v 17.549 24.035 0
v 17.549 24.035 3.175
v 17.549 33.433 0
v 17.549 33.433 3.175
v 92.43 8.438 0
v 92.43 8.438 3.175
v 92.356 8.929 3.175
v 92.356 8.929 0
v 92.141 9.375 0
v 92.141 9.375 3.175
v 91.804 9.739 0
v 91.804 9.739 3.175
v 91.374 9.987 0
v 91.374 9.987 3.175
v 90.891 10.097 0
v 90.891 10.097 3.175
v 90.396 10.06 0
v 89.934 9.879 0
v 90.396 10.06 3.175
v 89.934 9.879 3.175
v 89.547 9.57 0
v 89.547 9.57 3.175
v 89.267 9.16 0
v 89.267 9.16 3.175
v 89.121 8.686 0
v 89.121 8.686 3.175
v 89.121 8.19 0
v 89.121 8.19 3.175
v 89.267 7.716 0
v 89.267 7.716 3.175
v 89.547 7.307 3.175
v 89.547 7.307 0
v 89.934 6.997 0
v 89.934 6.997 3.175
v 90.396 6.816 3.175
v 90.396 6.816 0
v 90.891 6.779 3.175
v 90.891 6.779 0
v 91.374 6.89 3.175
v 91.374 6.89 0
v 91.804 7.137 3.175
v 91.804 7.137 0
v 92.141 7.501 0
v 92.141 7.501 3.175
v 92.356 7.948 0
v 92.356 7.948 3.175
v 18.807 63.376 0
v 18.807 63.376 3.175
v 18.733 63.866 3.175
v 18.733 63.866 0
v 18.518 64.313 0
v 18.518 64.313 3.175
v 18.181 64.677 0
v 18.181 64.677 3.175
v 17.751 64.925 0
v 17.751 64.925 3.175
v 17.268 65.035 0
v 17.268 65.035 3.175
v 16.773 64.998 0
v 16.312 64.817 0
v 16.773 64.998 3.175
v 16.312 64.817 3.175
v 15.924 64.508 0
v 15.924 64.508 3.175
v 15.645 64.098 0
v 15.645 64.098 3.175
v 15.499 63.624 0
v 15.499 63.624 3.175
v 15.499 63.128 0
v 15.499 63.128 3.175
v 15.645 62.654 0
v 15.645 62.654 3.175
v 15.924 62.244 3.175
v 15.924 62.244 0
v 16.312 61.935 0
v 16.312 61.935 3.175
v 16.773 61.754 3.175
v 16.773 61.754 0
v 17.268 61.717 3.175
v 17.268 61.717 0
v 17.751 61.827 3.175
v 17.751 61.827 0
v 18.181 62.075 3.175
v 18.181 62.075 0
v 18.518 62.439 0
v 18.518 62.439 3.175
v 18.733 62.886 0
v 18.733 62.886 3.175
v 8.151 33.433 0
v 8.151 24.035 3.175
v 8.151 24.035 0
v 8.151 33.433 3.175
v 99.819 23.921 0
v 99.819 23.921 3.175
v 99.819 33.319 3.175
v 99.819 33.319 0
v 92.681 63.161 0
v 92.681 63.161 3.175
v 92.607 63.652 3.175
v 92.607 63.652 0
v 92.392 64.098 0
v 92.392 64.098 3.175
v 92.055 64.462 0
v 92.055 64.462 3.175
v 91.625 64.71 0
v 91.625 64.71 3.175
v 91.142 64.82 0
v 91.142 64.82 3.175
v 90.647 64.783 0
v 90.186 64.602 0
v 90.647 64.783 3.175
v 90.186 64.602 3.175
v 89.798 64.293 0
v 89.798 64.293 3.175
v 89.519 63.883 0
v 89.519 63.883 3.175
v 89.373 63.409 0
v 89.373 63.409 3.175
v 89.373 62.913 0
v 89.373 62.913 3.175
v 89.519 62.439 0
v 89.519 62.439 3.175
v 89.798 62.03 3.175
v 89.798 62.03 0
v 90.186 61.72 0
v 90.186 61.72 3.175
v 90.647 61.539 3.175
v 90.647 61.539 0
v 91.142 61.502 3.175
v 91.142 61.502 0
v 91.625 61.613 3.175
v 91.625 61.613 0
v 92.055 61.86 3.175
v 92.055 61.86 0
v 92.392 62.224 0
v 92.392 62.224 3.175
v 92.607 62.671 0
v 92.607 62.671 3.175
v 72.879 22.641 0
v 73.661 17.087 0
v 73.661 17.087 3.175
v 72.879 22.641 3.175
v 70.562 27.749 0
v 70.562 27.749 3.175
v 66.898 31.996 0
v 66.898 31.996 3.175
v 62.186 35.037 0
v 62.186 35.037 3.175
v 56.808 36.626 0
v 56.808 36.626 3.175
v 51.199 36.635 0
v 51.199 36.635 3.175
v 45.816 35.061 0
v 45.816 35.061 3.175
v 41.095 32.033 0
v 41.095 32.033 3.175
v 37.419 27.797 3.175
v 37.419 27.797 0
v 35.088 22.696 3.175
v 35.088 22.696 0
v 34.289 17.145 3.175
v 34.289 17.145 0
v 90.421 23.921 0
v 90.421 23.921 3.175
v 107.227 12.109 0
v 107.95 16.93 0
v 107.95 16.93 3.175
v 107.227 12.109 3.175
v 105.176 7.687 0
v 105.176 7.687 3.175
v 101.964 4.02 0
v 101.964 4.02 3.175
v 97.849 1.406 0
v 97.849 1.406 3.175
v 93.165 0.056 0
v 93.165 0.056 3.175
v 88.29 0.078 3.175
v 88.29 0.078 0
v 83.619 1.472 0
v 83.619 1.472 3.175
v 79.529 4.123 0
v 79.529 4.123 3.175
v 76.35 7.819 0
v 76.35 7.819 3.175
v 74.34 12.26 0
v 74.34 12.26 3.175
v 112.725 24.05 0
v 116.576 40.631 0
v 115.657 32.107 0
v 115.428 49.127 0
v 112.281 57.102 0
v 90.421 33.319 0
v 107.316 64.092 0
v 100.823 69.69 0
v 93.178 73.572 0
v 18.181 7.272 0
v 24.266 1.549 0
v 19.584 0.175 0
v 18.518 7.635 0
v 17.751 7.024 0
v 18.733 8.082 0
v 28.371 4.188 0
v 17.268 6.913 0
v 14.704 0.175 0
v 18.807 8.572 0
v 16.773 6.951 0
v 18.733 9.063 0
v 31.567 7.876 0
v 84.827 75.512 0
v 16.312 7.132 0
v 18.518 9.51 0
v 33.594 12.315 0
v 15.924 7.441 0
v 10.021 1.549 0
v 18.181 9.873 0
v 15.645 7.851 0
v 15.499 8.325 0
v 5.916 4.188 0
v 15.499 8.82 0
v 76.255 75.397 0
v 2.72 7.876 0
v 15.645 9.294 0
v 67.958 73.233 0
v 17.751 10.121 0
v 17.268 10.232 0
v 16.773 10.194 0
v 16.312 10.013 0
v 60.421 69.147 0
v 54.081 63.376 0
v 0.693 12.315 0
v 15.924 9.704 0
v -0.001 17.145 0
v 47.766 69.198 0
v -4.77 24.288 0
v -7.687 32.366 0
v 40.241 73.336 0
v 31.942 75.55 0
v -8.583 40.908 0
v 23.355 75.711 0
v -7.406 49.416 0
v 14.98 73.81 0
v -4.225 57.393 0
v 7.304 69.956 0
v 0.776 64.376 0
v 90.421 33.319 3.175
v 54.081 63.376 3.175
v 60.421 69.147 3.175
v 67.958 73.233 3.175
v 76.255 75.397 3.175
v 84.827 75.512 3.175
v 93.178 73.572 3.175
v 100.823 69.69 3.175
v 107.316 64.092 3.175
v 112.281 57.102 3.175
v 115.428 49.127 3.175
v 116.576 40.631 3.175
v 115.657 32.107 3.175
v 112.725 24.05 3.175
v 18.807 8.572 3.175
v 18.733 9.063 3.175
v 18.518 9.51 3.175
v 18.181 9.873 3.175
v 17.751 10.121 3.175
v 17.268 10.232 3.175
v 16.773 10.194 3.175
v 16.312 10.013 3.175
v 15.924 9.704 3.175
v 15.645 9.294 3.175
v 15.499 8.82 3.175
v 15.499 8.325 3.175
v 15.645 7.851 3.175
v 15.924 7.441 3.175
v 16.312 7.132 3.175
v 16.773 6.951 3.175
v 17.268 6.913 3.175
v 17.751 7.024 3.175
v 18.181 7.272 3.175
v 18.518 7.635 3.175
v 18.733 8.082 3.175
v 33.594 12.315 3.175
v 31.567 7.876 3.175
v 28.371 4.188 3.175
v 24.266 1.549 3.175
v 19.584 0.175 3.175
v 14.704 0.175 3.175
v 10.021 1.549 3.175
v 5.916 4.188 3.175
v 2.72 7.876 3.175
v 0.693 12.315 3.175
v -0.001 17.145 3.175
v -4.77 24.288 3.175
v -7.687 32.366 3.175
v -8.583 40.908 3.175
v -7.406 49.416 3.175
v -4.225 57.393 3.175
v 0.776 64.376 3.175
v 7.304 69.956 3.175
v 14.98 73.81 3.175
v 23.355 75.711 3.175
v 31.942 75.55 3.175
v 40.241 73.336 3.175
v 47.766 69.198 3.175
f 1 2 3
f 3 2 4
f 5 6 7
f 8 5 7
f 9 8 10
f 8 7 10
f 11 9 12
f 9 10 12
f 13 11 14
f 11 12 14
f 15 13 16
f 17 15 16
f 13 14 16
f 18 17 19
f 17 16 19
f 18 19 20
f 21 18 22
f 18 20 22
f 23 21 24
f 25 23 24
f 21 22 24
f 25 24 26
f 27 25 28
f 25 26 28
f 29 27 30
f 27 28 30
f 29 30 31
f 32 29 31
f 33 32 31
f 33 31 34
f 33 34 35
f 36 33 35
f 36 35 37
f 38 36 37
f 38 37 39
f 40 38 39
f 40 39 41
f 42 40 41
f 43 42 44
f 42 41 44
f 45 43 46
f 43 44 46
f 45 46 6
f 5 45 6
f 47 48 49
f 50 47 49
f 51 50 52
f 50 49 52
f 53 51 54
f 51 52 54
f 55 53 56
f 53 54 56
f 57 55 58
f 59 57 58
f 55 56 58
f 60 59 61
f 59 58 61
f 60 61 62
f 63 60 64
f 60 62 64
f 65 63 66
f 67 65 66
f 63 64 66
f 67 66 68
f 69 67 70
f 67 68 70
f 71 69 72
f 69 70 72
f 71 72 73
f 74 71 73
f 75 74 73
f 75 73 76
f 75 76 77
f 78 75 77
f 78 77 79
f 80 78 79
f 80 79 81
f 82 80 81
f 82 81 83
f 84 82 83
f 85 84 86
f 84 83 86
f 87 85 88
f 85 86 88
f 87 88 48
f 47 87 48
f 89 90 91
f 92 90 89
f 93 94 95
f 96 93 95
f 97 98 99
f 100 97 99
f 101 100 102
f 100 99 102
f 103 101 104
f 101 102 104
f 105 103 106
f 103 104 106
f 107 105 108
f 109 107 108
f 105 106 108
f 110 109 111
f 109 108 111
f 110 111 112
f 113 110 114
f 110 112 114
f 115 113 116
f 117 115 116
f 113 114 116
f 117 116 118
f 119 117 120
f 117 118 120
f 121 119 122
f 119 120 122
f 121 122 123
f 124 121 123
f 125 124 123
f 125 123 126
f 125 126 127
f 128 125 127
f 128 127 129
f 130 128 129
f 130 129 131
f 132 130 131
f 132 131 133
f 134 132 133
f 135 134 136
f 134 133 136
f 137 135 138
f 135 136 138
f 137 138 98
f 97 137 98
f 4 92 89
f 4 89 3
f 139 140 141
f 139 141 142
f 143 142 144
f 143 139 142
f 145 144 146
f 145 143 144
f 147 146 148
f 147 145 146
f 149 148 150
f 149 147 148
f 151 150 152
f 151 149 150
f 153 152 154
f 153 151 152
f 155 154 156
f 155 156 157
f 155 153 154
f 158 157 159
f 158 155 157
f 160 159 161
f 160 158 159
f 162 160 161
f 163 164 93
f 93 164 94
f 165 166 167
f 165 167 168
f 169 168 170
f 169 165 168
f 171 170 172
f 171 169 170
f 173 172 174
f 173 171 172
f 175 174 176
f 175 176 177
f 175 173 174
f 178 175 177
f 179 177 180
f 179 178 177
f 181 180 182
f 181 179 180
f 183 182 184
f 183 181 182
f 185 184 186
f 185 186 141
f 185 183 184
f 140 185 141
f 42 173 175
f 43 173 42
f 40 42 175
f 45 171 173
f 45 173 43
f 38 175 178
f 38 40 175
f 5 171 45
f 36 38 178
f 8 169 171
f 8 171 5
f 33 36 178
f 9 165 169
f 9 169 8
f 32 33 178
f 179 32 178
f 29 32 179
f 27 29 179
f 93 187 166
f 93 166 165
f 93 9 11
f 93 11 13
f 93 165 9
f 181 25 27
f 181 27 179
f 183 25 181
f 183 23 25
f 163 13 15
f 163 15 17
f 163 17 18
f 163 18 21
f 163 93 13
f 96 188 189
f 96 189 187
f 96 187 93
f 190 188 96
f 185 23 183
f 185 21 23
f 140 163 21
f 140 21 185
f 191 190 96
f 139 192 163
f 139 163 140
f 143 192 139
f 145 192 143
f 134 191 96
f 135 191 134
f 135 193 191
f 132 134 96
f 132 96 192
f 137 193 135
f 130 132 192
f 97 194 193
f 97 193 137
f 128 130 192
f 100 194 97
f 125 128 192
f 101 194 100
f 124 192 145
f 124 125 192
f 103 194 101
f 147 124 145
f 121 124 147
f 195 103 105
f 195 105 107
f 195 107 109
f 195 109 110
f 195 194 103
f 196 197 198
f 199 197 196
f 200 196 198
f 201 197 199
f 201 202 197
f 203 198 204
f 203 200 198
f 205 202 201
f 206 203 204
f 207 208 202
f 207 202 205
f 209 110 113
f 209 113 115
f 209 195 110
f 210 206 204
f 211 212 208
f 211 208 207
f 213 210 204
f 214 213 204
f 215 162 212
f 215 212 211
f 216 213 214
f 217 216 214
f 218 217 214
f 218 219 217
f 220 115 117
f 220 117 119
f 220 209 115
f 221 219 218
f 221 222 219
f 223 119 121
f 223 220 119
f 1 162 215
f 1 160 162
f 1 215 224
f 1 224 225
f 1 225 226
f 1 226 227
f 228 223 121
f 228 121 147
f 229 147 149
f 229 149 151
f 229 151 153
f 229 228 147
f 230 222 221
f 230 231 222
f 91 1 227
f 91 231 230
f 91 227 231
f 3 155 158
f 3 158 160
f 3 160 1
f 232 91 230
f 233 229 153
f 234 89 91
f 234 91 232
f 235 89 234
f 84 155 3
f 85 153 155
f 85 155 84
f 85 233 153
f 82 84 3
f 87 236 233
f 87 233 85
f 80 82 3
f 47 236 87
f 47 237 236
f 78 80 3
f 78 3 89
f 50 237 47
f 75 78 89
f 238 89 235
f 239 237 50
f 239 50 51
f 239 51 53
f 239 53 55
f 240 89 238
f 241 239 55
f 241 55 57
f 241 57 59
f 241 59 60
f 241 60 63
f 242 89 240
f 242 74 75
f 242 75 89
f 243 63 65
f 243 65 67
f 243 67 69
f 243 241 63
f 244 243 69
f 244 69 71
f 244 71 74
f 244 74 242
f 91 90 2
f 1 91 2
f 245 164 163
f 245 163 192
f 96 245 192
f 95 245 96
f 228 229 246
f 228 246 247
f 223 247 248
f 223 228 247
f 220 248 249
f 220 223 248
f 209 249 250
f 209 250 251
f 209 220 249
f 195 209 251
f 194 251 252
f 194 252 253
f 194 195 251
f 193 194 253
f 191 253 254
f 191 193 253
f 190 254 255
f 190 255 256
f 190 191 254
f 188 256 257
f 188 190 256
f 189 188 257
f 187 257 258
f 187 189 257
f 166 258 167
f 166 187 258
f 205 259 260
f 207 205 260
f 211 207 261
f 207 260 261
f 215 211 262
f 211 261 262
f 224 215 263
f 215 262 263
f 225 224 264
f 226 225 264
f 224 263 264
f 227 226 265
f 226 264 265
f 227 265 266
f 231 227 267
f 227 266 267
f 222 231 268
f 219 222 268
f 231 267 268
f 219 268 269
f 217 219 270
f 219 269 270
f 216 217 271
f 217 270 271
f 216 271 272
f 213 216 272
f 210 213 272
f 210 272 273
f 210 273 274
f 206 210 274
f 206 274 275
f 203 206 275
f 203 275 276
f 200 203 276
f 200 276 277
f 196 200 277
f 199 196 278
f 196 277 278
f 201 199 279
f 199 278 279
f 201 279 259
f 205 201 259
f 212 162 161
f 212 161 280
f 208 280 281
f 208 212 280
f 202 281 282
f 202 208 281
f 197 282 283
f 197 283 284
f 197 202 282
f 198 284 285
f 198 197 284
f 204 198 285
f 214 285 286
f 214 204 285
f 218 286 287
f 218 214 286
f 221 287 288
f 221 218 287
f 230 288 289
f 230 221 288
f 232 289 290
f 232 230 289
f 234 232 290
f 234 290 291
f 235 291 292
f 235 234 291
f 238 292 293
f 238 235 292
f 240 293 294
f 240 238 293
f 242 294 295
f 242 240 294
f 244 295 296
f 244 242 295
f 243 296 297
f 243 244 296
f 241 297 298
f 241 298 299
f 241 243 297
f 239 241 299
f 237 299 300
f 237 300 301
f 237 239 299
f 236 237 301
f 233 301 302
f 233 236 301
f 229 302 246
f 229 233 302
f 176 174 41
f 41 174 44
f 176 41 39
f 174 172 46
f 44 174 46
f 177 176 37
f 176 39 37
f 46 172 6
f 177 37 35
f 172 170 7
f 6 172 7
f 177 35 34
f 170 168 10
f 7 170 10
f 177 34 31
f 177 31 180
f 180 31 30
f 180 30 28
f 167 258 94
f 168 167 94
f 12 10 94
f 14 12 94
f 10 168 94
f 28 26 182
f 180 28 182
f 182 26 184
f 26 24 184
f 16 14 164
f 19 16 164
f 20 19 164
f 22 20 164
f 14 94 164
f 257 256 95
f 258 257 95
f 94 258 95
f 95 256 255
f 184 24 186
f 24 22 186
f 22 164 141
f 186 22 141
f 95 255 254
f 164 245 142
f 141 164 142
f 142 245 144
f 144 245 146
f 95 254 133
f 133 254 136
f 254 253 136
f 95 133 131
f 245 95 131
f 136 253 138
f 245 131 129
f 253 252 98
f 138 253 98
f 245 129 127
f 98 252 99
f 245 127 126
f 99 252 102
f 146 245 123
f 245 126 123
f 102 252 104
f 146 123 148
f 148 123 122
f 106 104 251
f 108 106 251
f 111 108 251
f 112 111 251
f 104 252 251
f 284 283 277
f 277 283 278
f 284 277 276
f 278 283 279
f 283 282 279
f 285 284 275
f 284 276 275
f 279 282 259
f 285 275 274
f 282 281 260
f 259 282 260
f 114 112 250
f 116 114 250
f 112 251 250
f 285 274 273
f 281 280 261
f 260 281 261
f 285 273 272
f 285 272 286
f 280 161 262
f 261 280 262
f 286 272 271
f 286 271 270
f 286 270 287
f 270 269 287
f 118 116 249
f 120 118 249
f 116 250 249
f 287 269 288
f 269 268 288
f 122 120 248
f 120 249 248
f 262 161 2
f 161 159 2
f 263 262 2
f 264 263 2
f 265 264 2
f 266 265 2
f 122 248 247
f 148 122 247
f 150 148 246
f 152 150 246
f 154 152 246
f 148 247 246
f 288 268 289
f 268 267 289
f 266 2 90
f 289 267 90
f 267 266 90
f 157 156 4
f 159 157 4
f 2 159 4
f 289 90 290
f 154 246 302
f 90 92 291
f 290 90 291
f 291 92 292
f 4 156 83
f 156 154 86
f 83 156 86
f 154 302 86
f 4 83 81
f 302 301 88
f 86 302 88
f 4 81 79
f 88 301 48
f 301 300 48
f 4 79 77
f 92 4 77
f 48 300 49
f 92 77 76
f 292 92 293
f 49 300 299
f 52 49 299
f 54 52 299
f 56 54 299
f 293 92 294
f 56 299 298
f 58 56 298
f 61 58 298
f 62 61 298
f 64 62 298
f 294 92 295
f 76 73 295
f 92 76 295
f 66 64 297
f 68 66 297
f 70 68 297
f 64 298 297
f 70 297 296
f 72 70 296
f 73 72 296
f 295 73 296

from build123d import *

# Parameters (mm, degrees)
BOSS_EXTRUDE1_DEPTH = 3.175
SKETCH2_R           = 1.6637
CUT_EXTRUDE1_DEPTH  = 3.175
SKETCH3_W           = 9.398
SKETCH3_H           = 9.398
CUT_EXTRUDE2_DEPTH  = 3.175


with BuildPart() as part:
    # Sketch1 → Boss-Extrude1 (new body)
    with BuildSketch(Plane.XY):
        with BuildLine():
            ThreePointArc((34.288648696, 17.145), (17.143648696, 0), (-0.001351304, 17.145))
            ThreePointArc((-0.001351304, 17.145), (3.871238611, 67.363724589), (54.080955836, 63.376050056))
            ThreePointArc((54.080955836, 63.376050056), (104.238720612, 67.087510011), (107.950180567, 16.929745235))
            ThreePointArc((107.950180567, 16.929745235), (90.72699247, -0.107108433), (73.66126725, 17.087472513))
            ThreePointArc((73.66126725, 17.087472513), (54.003763774, 36.831330291), (34.288648696, 17.145))
        make_face()
    extrude(amount=BOSS_EXTRUDE1_DEPTH)

    # Sketch2 → Cut-Extrude1 (cut)
    with BuildSketch(Plane.XY.offset(3.175)):
        with Locations((17.143648696, 8.5725)):
            Circle(SKETCH2_R)
        with Locations((90.766339889, 8.438225181)):
            Circle(SKETCH2_R)
        with Locations((17.143648696, 63.376050056)):
            Circle(SKETCH2_R)
        with Locations((91.017638263, 63.161224448)):
            Circle(SKETCH2_R)
    extrude(amount=-CUT_EXTRUDE1_DEPTH, mode=Mode.SUBTRACT)

    # Sketch3 → Cut-Extrude2 (cut)
    with BuildSketch(Plane.XY.offset(3.175)):
        with Locations((12.850394595, 28.73375)):
            Rectangle(SKETCH3_W, SKETCH3_H)
        with Locations((95.120347818, 28.620185079)):
            Rectangle(SKETCH3_W, SKETCH3_H)
    extrude(amount=-CUT_EXTRUDE2_DEPTH, mode=Mode.SUBTRACT)


solid = part.part
